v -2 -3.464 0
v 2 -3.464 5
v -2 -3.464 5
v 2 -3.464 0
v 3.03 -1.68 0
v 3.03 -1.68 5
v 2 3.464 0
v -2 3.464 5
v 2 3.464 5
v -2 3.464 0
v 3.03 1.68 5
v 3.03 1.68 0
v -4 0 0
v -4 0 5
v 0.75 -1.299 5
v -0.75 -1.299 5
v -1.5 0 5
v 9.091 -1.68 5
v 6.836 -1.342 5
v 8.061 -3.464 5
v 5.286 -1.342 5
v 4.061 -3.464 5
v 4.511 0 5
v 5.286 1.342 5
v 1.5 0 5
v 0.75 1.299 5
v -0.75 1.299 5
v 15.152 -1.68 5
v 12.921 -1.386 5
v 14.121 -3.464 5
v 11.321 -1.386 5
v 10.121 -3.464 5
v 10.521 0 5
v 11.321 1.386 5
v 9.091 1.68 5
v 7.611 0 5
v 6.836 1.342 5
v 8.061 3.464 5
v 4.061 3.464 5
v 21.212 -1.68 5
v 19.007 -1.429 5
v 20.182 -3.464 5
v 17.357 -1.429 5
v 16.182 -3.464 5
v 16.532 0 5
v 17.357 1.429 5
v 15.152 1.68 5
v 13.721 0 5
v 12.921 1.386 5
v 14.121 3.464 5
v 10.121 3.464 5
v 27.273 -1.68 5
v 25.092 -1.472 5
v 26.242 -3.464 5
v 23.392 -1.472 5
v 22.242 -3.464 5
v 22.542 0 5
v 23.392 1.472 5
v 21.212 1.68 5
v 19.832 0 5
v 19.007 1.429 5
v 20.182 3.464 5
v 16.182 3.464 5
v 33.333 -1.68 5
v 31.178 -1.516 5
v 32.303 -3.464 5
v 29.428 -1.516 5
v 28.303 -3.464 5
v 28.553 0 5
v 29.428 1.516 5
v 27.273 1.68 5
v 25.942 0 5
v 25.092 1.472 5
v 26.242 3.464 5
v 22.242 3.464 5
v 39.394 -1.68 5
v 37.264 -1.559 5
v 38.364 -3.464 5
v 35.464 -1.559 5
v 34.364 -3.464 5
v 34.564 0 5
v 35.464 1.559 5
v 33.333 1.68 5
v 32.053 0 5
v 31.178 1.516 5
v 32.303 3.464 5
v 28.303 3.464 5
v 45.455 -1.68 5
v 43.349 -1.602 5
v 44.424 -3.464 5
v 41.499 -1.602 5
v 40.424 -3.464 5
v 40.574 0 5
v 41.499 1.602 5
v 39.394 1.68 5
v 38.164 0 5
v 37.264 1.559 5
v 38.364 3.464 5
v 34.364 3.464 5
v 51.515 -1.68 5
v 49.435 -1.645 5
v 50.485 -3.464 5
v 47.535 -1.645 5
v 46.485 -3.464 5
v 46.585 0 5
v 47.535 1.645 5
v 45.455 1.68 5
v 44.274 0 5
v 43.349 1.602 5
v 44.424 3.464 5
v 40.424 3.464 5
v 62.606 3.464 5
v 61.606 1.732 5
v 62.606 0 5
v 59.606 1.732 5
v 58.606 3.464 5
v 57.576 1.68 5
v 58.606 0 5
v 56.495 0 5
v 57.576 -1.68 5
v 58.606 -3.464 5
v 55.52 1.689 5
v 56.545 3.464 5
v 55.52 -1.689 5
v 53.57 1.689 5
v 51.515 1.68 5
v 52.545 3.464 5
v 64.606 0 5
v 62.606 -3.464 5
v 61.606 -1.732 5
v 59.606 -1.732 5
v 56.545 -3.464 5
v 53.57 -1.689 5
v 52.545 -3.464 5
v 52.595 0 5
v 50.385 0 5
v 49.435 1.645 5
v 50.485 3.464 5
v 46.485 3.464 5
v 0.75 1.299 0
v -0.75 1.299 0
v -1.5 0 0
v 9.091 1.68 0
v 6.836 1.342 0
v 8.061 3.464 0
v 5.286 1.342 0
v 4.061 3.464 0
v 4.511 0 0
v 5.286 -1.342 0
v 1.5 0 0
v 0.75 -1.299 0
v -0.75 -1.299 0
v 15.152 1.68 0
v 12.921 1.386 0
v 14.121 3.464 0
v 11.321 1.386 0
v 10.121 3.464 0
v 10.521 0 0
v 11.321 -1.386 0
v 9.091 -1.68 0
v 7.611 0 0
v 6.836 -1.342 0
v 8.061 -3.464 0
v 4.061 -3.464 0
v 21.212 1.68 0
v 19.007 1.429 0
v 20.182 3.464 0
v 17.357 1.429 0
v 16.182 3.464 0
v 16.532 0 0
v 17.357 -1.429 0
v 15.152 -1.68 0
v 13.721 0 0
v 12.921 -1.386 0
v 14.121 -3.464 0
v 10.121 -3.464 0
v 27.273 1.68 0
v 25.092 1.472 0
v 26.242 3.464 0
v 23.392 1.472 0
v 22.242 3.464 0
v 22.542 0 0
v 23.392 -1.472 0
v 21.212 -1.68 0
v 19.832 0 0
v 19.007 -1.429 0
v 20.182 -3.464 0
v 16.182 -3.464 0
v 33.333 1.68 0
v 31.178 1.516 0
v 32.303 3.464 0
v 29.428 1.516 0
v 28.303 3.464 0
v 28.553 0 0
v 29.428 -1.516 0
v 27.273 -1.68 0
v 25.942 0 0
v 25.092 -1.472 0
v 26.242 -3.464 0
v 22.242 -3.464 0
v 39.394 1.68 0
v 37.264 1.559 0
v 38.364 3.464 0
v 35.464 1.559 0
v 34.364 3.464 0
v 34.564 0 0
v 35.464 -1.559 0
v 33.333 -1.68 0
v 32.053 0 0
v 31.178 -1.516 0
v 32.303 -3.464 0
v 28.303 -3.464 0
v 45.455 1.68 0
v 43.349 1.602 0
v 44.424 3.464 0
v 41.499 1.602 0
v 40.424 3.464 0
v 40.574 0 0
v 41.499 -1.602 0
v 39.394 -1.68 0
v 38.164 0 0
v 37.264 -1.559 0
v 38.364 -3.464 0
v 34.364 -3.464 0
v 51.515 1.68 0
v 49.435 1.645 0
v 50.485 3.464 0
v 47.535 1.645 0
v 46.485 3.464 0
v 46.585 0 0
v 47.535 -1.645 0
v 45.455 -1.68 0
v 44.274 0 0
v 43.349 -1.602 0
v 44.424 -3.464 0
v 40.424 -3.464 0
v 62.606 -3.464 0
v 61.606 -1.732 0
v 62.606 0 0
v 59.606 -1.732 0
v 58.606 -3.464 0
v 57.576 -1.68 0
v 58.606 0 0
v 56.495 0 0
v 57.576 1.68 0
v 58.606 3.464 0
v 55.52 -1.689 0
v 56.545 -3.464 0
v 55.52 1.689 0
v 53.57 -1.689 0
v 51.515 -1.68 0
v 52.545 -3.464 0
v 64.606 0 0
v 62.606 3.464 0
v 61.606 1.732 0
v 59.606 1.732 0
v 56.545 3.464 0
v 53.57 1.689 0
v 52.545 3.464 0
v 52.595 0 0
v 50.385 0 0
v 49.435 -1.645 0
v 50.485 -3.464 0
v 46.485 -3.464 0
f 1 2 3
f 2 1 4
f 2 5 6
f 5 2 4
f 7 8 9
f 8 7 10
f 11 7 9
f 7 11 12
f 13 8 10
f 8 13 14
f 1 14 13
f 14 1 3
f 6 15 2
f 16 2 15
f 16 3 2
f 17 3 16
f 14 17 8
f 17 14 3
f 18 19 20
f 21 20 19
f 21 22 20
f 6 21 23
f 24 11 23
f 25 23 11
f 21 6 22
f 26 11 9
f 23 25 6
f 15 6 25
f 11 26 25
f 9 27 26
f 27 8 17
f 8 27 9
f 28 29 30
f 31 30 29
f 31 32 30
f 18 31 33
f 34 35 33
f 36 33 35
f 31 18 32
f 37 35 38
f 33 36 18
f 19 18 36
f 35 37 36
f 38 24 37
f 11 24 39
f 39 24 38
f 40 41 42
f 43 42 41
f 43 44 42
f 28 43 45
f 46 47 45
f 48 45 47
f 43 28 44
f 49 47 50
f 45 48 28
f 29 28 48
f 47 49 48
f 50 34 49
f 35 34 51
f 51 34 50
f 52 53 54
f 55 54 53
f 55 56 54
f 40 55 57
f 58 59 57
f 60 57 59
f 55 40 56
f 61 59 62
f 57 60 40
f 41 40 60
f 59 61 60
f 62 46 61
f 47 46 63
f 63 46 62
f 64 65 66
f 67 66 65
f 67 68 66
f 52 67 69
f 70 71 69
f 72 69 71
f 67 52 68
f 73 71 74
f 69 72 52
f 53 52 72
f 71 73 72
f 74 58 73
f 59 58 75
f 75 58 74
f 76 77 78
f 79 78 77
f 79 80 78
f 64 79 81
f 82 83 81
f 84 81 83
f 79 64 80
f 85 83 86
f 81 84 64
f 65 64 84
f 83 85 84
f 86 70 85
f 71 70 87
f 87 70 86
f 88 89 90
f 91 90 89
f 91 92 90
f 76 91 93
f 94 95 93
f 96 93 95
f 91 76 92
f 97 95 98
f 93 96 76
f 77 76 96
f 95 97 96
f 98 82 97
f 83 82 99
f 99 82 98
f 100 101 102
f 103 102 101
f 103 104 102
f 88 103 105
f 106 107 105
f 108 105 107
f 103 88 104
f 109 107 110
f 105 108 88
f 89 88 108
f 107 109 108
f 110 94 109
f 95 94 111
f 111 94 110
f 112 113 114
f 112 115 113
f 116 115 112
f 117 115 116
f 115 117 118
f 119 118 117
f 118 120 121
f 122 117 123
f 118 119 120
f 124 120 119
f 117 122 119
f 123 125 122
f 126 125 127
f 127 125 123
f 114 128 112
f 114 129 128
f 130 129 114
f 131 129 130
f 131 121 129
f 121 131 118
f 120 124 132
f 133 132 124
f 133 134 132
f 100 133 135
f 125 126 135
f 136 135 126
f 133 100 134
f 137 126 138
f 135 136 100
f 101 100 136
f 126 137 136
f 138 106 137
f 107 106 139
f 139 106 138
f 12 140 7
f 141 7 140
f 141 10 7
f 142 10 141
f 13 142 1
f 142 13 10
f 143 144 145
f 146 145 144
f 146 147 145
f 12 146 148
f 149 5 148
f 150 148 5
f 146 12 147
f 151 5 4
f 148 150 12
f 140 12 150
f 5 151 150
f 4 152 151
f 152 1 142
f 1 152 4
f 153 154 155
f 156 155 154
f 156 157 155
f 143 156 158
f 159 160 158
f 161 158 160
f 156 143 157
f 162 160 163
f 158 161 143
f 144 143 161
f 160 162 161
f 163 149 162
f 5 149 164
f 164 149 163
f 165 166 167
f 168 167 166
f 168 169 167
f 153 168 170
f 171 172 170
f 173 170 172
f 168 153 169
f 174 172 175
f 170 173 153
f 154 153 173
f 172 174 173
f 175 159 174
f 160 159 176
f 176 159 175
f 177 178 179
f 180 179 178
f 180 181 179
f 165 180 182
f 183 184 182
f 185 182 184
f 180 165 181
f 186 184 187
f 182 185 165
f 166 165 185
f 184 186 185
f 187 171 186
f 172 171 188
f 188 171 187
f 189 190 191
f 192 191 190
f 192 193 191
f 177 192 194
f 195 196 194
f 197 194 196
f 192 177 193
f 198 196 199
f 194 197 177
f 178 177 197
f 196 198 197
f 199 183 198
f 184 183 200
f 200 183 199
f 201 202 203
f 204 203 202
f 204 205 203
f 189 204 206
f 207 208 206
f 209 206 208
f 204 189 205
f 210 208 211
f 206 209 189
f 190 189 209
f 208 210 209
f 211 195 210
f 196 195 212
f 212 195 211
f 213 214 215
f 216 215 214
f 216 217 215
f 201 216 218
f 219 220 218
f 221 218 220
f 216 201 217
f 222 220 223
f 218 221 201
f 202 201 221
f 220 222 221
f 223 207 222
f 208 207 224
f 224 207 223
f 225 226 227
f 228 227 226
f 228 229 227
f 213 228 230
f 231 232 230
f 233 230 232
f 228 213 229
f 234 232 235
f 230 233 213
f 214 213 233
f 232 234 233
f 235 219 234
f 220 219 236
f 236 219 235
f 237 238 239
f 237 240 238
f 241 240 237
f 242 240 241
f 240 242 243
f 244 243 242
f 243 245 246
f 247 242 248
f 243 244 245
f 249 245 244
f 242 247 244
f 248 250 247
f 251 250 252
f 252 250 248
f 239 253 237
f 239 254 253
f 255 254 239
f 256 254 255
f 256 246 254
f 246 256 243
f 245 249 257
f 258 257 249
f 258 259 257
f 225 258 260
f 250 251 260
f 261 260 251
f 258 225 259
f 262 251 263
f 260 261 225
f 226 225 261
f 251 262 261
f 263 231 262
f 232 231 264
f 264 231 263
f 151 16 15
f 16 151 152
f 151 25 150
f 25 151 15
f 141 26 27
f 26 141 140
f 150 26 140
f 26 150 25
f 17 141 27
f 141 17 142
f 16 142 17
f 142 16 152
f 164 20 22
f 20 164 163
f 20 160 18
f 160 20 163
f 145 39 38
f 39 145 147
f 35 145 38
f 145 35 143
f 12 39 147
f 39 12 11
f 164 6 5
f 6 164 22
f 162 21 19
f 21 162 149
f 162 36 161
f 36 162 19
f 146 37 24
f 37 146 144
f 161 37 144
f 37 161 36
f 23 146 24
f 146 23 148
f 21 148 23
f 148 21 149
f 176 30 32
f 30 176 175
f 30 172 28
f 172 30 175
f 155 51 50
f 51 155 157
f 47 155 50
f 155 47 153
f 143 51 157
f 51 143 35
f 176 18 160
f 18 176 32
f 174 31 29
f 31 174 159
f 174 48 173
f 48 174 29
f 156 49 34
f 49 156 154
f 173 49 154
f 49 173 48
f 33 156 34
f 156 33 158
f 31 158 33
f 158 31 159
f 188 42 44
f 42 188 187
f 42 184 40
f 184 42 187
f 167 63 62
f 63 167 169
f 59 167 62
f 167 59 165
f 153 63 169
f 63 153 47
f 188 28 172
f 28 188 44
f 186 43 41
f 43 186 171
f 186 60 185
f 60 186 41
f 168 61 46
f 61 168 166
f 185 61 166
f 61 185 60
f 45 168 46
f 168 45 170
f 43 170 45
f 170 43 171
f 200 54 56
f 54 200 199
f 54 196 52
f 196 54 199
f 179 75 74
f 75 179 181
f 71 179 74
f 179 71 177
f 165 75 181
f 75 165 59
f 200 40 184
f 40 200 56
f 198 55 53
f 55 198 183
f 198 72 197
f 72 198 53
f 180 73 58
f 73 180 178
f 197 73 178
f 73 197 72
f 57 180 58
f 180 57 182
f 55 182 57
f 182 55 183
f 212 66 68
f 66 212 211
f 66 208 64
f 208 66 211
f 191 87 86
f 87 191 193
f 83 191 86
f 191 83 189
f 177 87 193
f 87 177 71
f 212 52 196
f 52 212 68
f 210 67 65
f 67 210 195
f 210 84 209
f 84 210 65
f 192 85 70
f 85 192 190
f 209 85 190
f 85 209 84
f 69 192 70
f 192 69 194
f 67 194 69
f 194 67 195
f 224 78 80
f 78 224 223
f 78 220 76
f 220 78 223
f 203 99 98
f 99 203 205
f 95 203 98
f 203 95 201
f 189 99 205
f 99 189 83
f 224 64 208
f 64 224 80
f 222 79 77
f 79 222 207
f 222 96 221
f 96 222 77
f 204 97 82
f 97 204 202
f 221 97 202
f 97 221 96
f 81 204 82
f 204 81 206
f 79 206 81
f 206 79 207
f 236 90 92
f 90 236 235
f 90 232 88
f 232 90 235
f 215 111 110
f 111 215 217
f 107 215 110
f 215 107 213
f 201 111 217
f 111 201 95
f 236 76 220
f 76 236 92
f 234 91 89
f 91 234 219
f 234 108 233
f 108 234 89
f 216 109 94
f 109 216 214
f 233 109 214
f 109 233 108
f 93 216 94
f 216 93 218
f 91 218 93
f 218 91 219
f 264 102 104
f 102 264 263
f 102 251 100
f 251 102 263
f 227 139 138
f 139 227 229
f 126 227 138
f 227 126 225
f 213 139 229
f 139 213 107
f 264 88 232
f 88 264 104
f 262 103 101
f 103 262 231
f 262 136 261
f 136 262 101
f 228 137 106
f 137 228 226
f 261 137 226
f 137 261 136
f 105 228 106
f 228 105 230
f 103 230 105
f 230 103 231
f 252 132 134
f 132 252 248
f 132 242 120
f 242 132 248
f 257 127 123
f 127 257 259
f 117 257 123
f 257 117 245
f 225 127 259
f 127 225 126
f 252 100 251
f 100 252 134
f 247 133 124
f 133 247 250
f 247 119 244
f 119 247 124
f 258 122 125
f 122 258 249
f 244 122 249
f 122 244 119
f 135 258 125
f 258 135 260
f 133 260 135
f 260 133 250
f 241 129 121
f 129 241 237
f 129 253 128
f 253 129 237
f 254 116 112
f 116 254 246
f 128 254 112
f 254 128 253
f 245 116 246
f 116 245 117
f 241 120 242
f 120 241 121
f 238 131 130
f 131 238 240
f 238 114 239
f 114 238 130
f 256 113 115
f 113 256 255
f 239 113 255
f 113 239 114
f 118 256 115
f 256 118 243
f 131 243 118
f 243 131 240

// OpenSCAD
$fn=6;

module thehole(x) {
    difference() {
        cylinder(h=5, d=8);
        cylinder(h=10, d=x);
    }
}

for (i = [0:10:100]) {
    translate([i/1.65,0,0])
        thehole(3+i/100);
}
